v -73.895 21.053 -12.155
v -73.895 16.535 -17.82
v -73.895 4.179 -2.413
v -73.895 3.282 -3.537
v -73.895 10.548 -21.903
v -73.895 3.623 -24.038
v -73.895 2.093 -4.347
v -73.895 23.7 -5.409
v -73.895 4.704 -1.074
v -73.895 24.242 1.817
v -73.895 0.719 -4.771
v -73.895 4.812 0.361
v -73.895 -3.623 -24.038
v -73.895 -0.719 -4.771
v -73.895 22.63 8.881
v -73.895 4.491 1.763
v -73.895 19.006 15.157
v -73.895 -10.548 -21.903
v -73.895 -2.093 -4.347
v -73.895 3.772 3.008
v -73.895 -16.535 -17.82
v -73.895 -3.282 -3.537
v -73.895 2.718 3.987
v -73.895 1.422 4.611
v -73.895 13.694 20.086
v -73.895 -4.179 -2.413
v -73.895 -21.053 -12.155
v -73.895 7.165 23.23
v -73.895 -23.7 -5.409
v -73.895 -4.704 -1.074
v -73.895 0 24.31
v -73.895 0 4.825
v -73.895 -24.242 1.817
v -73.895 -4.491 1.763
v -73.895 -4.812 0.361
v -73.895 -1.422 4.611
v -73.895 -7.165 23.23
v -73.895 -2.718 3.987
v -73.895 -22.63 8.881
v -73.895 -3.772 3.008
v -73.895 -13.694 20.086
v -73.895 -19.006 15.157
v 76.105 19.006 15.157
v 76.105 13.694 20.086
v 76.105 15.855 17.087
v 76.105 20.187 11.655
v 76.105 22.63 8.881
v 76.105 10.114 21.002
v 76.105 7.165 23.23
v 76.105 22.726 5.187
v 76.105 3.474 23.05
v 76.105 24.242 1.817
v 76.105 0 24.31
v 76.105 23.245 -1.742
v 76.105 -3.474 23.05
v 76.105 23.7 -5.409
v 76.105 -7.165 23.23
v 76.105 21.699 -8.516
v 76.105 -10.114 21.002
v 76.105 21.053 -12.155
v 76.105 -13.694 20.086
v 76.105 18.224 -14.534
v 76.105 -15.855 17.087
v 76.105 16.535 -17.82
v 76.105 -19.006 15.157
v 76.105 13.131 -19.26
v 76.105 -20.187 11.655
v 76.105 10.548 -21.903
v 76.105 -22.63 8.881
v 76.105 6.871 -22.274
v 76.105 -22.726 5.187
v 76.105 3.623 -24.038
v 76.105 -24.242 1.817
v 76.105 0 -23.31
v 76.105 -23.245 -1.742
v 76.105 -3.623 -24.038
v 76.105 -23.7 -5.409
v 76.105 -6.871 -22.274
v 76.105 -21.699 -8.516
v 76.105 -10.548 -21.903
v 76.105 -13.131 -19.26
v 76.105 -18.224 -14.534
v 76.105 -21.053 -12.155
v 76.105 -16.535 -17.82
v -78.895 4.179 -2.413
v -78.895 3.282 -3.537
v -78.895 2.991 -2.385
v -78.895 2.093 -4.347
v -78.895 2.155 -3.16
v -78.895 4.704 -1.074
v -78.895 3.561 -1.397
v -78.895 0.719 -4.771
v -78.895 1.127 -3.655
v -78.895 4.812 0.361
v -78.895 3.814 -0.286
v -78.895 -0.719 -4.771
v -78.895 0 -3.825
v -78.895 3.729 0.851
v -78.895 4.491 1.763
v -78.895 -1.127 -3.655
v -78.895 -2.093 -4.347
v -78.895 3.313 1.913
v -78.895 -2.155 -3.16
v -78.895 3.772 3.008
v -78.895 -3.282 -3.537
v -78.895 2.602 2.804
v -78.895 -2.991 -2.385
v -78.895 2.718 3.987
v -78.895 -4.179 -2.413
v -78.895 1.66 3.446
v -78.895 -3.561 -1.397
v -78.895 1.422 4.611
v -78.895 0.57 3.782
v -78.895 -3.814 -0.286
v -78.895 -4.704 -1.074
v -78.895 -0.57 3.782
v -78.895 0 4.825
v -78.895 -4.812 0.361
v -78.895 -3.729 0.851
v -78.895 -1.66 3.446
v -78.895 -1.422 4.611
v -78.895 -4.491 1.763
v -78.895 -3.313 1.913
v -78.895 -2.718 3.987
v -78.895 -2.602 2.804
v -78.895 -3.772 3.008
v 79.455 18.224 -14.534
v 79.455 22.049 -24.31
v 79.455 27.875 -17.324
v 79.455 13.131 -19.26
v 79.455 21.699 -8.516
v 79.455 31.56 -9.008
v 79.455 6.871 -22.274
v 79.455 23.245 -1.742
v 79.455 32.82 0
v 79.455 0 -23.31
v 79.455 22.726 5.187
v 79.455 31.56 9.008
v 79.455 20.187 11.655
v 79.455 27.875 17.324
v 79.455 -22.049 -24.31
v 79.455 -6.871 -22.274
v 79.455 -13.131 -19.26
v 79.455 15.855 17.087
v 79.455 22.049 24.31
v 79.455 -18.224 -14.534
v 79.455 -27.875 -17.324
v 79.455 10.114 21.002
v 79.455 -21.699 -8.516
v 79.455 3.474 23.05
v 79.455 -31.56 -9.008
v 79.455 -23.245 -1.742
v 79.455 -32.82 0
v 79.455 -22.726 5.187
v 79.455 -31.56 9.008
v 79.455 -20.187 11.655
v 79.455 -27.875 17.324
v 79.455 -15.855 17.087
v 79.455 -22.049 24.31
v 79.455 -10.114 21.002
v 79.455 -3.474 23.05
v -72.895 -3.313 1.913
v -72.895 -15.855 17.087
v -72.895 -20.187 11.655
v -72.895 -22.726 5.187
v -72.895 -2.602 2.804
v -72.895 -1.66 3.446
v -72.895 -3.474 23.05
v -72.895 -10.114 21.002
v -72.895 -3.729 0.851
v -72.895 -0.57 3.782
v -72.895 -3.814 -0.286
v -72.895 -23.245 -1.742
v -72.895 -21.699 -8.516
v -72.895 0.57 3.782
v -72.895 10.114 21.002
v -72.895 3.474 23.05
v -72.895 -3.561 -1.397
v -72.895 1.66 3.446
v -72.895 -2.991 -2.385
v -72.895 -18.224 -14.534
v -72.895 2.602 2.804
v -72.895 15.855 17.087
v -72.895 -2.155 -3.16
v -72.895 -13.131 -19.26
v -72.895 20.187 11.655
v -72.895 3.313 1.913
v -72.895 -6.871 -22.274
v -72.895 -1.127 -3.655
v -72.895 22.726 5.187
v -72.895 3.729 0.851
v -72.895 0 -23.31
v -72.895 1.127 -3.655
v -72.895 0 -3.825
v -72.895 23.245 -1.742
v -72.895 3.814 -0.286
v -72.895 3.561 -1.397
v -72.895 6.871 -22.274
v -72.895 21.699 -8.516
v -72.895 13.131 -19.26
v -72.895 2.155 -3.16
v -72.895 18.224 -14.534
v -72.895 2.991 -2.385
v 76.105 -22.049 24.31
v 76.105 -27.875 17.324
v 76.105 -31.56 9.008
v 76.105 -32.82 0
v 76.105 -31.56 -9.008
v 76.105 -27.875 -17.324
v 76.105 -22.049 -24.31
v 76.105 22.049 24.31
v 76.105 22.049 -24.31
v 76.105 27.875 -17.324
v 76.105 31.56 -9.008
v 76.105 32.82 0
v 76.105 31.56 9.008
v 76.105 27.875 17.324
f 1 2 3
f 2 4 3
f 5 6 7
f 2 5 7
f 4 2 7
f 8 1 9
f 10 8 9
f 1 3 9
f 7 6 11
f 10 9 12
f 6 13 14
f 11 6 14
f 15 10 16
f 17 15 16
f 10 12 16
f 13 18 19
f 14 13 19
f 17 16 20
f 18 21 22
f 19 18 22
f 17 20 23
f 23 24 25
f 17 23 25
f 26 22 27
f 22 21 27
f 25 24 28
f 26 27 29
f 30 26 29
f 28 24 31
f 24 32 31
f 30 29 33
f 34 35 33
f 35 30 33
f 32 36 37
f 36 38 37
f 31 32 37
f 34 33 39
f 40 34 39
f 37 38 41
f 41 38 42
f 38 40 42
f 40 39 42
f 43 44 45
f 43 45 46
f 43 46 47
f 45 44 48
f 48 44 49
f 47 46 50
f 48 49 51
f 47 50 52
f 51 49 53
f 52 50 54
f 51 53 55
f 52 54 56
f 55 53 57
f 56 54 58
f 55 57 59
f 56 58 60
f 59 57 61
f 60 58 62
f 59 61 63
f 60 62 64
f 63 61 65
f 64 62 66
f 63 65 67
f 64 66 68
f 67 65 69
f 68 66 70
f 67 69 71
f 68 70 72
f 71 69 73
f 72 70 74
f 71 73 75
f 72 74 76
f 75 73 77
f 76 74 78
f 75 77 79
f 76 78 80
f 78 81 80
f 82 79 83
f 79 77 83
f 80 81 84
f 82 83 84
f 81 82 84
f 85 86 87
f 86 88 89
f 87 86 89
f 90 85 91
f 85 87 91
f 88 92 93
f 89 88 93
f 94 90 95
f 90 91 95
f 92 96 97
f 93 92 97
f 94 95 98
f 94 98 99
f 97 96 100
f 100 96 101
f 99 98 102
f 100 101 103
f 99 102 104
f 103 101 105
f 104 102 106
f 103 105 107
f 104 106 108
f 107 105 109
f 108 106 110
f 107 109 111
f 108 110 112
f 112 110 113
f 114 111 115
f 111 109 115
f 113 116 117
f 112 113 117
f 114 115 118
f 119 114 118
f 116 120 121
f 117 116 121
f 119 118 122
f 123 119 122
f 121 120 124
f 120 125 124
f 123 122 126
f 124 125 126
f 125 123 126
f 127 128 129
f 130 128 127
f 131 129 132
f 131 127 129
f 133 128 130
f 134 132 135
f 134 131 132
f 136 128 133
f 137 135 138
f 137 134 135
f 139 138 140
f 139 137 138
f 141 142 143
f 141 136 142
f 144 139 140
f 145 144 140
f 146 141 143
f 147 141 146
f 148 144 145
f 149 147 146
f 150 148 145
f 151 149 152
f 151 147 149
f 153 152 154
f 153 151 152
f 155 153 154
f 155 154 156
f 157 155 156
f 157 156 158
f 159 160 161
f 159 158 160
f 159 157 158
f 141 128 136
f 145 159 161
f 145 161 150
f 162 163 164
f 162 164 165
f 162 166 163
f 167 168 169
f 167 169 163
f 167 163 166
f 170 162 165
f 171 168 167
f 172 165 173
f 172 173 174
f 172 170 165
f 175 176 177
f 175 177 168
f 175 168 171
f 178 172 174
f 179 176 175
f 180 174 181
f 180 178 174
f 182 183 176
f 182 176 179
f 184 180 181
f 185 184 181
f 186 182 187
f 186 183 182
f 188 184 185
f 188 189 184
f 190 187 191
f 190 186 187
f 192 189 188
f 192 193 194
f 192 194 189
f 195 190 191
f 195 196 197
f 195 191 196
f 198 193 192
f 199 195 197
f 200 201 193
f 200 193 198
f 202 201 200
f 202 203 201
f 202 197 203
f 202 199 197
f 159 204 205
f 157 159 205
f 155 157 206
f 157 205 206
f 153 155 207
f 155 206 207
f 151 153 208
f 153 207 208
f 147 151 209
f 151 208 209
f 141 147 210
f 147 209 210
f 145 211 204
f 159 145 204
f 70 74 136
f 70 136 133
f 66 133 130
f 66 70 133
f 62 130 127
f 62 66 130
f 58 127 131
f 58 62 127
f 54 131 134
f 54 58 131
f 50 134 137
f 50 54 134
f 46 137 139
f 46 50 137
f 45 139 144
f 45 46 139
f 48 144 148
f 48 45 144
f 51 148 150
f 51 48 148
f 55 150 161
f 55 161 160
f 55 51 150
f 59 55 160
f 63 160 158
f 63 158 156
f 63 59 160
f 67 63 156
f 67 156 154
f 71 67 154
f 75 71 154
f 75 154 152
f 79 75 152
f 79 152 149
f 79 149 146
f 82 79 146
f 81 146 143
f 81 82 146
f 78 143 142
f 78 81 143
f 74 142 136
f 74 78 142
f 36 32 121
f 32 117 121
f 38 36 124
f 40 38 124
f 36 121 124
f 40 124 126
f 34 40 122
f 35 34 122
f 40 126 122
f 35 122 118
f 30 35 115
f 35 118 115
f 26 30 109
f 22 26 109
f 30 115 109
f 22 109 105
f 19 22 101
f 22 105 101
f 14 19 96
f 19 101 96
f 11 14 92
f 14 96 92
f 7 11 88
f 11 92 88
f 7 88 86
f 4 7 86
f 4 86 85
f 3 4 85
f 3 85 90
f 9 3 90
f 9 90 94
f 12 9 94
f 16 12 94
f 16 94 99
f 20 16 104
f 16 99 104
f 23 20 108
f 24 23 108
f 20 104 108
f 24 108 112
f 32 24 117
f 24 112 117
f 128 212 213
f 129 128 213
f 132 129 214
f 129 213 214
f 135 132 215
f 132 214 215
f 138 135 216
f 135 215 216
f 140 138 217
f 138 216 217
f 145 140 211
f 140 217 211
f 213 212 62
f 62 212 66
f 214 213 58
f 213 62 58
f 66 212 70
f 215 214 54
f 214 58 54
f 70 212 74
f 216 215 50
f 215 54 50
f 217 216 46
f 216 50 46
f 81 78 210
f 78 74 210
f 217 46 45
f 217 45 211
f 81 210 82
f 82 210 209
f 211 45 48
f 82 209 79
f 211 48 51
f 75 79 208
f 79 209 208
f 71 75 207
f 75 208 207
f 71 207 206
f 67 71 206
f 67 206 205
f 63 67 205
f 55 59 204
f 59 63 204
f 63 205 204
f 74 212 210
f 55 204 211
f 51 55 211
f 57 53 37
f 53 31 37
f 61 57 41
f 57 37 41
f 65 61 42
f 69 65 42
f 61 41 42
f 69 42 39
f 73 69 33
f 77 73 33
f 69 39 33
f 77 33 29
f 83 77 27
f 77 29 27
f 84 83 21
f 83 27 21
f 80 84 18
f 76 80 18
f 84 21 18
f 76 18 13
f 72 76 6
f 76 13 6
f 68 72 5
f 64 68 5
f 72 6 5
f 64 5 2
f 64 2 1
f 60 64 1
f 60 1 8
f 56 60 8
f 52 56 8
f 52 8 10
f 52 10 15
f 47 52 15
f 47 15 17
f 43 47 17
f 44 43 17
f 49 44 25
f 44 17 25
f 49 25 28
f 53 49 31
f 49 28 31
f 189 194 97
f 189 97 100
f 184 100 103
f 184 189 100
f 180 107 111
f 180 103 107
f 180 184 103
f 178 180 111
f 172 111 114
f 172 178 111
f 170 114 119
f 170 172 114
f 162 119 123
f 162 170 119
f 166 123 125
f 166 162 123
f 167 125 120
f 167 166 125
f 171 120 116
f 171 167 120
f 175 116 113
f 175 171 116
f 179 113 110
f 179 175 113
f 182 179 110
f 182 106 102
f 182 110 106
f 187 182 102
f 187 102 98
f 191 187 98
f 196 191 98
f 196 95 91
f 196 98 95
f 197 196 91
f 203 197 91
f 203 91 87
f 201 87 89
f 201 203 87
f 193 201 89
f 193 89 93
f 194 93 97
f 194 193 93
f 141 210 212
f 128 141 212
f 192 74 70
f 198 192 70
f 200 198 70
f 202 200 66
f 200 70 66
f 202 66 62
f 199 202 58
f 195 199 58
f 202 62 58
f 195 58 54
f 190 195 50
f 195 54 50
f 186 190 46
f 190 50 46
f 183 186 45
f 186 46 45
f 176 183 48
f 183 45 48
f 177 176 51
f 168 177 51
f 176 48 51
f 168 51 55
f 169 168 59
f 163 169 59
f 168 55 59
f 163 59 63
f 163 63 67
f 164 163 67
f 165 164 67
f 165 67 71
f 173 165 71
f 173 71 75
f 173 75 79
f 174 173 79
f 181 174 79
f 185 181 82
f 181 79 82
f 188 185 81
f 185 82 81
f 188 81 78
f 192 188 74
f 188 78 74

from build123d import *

# Parameters (mm, degrees)
CUT_EXTRUDE1_DEPTH      = 45
CUT_EXTRUDE1_DEPTH_BACK = 260
SKETCH2_R               = 3.825
SKETCH3_R               = 23.31
CUT_EXTRUDE2_DEPTH      = 149
SKETCH4_R               = 24.31
SKETCH4_R_2             = 23.31
BOSS_EXTRUDE1_DEPTH     = 3.35


with BuildPart() as part:
    # Sketch1 → Revolve2 (revolve)
    with BuildSketch(Plane.XY, mode=Mode.PRIVATE) as revolve2_sk:
        Polygon((-73.894736842, 0), (76.105263158, 0), (76.105263158, 24.31), (-73.894736842, 24.31), (-73.894736842, 4.825), (-78.894736842, 4.825), (-78.894736842, 0), align=None)
    revolve(revolve2_sk.sketch.rotate(Axis((-73.894736842, 0, 0), (1, 0, 0)), 90), axis=Axis((-73.894736842, 0, 0), (1, 0, 0)))

    # Sketch2 → Cut-Extrude1 (cut, two sides: drawn at the far end of the back side and taken through both)
    with BuildSketch(Plane.ZY.offset(78.894736842).offset(-CUT_EXTRUDE1_DEPTH_BACK)):
        with Locations(Location((0, 0, 0), (0, 0, 180))):
            Circle(SKETCH2_R)
    extrude(amount=CUT_EXTRUDE1_DEPTH + CUT_EXTRUDE1_DEPTH_BACK, mode=Mode.SUBTRACT)

    # Sketch3 → Cut-Extrude2 (cut)
    with BuildSketch(Plane(origin=(76.105263158, 0, 0), x_dir=(0, 0, -1), z_dir=(1, 0, 0))):
        Circle(SKETCH3_R)
    extrude(amount=-CUT_EXTRUDE2_DEPTH, mode=Mode.SUBTRACT)


with BuildPart() as body_2:
    # Sketch4 → Boss-Extrude1 (new body)
    # profile 1 of 4: a face of its own
    with BuildSketch(Plane(origin=(76.105263158, 0, 0), x_dir=(0, 0, -1), z_dir=(1, 0, 0))):
        with BuildLine():
            ThreePointArc((-24.31, 0), (0, 24.31), (24.31, 0))
            Line((24.31, 0), (24.31, 22.049405888))
            ThreePointArc((24.31, 22.049405888), (0, 32.82), (-24.31, 22.049405888))
            Line((-24.31, 22.049405888), (-24.31, 0))
        make_face()
    # profile 2 of 4: a face of its own
    with BuildSketch(Plane(origin=(76.105263158, 0, 0), x_dir=(0, 0, -1), z_dir=(1, 0, 0))):
        with BuildLine():
            ThreePointArc((-24.31, 0), (0, 24.31), (24.31, 0))
            Line((24.31, 0), (24.31, 22.049405888))
            ThreePointArc((24.31, 22.049405888), (0, 32.82), (-24.31, 22.049405888))
            Line((-24.31, 22.049405888), (-24.31, 0))
        make_face()
    # profile 3 of 4: a face of its own
    with BuildSketch(Plane(origin=(76.105263158, 0, 0), x_dir=(0, 0, -1), z_dir=(1, 0, 0))):
        with BuildLine():
            Line((24.31, -22.049405888), (24.31, 0))
            ThreePointArc((24.31, 0), (0, -24.31), (-24.31, 0))
            Line((-24.31, 0), (-24.31, -22.049405888))
            ThreePointArc((-24.31, -22.049405888), (0, -32.82), (24.31, -22.049405888))
        make_face()
    # profile 4 of 4: a face of its own
    with BuildSketch(Plane(origin=(76.105263158, 0, 0), x_dir=(0, 0, -1), z_dir=(1, 0, 0))):
        with Locations(Location((0, 0, 0), (0, 0, 180))):
            Circle(SKETCH4_R)
        Circle(SKETCH4_R_2, mode=Mode.SUBTRACT)
    extrude(amount=BOSS_EXTRUDE1_DEPTH)


solid = Compound([part.part, body_2.part])
